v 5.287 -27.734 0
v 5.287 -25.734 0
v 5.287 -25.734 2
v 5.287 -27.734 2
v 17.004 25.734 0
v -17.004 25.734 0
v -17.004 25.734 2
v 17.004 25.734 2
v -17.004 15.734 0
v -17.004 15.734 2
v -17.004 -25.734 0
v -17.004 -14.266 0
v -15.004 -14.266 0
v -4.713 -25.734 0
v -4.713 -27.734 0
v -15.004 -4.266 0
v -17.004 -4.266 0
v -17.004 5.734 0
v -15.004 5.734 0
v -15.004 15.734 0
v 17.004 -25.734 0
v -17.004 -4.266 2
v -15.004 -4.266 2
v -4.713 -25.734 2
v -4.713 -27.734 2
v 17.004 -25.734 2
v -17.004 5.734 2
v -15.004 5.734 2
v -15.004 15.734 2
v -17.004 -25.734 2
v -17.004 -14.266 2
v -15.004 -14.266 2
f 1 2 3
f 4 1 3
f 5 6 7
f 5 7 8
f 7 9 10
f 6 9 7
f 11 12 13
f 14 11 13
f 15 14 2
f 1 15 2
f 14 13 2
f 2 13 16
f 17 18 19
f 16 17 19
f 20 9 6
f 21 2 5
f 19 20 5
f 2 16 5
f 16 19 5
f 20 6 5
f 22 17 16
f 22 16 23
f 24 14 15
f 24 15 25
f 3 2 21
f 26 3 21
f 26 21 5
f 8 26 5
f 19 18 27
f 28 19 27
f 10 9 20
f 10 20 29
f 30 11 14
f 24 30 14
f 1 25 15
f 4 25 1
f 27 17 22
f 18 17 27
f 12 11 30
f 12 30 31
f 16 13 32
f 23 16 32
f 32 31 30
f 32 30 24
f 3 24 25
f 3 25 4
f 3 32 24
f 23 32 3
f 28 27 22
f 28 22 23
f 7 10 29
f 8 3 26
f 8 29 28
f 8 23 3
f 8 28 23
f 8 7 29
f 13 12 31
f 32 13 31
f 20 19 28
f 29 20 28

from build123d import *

# Parameters (mm, degrees)
SKIZZE1_W                       = 34.00858099
SKIZZE1_H                       = 51.467136578
AUFSATZ_LINEAR_AUSTRAGEN1_DEPTH = 2
SKIZZE6_W                       = 10
SKIZZE6_H                       = 2
AUFSATZ_LINEAR_AUSTRAGEN2_DEPTH = 2
SKIZZE7_W                       = 2
SKIZZE7_H                       = 10
SCHNITT_LINEAR_AUSTRAGEN1_DEPTH = 2
SKIZZE8_W                       = 2
SKIZZE8_H                       = 10
SCHNITT_LINEAR_AUSTRAGEN2_DEPTH = 2


with BuildPart() as part:
    # Skizze1 → Aufsatz-Linear austragen1 (new body)
    with BuildSketch(Plane.XY):
        Rectangle(SKIZZE1_W, SKIZZE1_H)
    extrude(amount=AUFSATZ_LINEAR_AUSTRAGEN1_DEPTH)

    # Skizze6 → Aufsatz-Linear austragen2 (add)
    with BuildSketch(Plane.XZ.offset(25.733568289)):
        with Locations((0.286784859, 1)):
            Rectangle(SKIZZE6_W, SKIZZE6_H)
    extrude(amount=AUFSATZ_LINEAR_AUSTRAGEN2_DEPTH)

    # Skizze7 → Schnitt-Linear austragen1 (cut)
    with BuildSketch(Plane.ZY.offset(17.004290495)):
        with Locations((1, 10.733568289)):
            Rectangle(SKIZZE7_W, SKIZZE7_H)
    extrude(amount=-SCHNITT_LINEAR_AUSTRAGEN1_DEPTH, mode=Mode.SUBTRACT)

    # Skizze8 → Schnitt-Linear austragen2 (cut)
    with BuildSketch(Plane.ZY.offset(17.004290495)):
        with Locations((1, -9.266431711)):
            Rectangle(SKIZZE8_W, SKIZZE8_H)
    extrude(amount=-SCHNITT_LINEAR_AUSTRAGEN2_DEPTH, mode=Mode.SUBTRACT)


solid = part.part
